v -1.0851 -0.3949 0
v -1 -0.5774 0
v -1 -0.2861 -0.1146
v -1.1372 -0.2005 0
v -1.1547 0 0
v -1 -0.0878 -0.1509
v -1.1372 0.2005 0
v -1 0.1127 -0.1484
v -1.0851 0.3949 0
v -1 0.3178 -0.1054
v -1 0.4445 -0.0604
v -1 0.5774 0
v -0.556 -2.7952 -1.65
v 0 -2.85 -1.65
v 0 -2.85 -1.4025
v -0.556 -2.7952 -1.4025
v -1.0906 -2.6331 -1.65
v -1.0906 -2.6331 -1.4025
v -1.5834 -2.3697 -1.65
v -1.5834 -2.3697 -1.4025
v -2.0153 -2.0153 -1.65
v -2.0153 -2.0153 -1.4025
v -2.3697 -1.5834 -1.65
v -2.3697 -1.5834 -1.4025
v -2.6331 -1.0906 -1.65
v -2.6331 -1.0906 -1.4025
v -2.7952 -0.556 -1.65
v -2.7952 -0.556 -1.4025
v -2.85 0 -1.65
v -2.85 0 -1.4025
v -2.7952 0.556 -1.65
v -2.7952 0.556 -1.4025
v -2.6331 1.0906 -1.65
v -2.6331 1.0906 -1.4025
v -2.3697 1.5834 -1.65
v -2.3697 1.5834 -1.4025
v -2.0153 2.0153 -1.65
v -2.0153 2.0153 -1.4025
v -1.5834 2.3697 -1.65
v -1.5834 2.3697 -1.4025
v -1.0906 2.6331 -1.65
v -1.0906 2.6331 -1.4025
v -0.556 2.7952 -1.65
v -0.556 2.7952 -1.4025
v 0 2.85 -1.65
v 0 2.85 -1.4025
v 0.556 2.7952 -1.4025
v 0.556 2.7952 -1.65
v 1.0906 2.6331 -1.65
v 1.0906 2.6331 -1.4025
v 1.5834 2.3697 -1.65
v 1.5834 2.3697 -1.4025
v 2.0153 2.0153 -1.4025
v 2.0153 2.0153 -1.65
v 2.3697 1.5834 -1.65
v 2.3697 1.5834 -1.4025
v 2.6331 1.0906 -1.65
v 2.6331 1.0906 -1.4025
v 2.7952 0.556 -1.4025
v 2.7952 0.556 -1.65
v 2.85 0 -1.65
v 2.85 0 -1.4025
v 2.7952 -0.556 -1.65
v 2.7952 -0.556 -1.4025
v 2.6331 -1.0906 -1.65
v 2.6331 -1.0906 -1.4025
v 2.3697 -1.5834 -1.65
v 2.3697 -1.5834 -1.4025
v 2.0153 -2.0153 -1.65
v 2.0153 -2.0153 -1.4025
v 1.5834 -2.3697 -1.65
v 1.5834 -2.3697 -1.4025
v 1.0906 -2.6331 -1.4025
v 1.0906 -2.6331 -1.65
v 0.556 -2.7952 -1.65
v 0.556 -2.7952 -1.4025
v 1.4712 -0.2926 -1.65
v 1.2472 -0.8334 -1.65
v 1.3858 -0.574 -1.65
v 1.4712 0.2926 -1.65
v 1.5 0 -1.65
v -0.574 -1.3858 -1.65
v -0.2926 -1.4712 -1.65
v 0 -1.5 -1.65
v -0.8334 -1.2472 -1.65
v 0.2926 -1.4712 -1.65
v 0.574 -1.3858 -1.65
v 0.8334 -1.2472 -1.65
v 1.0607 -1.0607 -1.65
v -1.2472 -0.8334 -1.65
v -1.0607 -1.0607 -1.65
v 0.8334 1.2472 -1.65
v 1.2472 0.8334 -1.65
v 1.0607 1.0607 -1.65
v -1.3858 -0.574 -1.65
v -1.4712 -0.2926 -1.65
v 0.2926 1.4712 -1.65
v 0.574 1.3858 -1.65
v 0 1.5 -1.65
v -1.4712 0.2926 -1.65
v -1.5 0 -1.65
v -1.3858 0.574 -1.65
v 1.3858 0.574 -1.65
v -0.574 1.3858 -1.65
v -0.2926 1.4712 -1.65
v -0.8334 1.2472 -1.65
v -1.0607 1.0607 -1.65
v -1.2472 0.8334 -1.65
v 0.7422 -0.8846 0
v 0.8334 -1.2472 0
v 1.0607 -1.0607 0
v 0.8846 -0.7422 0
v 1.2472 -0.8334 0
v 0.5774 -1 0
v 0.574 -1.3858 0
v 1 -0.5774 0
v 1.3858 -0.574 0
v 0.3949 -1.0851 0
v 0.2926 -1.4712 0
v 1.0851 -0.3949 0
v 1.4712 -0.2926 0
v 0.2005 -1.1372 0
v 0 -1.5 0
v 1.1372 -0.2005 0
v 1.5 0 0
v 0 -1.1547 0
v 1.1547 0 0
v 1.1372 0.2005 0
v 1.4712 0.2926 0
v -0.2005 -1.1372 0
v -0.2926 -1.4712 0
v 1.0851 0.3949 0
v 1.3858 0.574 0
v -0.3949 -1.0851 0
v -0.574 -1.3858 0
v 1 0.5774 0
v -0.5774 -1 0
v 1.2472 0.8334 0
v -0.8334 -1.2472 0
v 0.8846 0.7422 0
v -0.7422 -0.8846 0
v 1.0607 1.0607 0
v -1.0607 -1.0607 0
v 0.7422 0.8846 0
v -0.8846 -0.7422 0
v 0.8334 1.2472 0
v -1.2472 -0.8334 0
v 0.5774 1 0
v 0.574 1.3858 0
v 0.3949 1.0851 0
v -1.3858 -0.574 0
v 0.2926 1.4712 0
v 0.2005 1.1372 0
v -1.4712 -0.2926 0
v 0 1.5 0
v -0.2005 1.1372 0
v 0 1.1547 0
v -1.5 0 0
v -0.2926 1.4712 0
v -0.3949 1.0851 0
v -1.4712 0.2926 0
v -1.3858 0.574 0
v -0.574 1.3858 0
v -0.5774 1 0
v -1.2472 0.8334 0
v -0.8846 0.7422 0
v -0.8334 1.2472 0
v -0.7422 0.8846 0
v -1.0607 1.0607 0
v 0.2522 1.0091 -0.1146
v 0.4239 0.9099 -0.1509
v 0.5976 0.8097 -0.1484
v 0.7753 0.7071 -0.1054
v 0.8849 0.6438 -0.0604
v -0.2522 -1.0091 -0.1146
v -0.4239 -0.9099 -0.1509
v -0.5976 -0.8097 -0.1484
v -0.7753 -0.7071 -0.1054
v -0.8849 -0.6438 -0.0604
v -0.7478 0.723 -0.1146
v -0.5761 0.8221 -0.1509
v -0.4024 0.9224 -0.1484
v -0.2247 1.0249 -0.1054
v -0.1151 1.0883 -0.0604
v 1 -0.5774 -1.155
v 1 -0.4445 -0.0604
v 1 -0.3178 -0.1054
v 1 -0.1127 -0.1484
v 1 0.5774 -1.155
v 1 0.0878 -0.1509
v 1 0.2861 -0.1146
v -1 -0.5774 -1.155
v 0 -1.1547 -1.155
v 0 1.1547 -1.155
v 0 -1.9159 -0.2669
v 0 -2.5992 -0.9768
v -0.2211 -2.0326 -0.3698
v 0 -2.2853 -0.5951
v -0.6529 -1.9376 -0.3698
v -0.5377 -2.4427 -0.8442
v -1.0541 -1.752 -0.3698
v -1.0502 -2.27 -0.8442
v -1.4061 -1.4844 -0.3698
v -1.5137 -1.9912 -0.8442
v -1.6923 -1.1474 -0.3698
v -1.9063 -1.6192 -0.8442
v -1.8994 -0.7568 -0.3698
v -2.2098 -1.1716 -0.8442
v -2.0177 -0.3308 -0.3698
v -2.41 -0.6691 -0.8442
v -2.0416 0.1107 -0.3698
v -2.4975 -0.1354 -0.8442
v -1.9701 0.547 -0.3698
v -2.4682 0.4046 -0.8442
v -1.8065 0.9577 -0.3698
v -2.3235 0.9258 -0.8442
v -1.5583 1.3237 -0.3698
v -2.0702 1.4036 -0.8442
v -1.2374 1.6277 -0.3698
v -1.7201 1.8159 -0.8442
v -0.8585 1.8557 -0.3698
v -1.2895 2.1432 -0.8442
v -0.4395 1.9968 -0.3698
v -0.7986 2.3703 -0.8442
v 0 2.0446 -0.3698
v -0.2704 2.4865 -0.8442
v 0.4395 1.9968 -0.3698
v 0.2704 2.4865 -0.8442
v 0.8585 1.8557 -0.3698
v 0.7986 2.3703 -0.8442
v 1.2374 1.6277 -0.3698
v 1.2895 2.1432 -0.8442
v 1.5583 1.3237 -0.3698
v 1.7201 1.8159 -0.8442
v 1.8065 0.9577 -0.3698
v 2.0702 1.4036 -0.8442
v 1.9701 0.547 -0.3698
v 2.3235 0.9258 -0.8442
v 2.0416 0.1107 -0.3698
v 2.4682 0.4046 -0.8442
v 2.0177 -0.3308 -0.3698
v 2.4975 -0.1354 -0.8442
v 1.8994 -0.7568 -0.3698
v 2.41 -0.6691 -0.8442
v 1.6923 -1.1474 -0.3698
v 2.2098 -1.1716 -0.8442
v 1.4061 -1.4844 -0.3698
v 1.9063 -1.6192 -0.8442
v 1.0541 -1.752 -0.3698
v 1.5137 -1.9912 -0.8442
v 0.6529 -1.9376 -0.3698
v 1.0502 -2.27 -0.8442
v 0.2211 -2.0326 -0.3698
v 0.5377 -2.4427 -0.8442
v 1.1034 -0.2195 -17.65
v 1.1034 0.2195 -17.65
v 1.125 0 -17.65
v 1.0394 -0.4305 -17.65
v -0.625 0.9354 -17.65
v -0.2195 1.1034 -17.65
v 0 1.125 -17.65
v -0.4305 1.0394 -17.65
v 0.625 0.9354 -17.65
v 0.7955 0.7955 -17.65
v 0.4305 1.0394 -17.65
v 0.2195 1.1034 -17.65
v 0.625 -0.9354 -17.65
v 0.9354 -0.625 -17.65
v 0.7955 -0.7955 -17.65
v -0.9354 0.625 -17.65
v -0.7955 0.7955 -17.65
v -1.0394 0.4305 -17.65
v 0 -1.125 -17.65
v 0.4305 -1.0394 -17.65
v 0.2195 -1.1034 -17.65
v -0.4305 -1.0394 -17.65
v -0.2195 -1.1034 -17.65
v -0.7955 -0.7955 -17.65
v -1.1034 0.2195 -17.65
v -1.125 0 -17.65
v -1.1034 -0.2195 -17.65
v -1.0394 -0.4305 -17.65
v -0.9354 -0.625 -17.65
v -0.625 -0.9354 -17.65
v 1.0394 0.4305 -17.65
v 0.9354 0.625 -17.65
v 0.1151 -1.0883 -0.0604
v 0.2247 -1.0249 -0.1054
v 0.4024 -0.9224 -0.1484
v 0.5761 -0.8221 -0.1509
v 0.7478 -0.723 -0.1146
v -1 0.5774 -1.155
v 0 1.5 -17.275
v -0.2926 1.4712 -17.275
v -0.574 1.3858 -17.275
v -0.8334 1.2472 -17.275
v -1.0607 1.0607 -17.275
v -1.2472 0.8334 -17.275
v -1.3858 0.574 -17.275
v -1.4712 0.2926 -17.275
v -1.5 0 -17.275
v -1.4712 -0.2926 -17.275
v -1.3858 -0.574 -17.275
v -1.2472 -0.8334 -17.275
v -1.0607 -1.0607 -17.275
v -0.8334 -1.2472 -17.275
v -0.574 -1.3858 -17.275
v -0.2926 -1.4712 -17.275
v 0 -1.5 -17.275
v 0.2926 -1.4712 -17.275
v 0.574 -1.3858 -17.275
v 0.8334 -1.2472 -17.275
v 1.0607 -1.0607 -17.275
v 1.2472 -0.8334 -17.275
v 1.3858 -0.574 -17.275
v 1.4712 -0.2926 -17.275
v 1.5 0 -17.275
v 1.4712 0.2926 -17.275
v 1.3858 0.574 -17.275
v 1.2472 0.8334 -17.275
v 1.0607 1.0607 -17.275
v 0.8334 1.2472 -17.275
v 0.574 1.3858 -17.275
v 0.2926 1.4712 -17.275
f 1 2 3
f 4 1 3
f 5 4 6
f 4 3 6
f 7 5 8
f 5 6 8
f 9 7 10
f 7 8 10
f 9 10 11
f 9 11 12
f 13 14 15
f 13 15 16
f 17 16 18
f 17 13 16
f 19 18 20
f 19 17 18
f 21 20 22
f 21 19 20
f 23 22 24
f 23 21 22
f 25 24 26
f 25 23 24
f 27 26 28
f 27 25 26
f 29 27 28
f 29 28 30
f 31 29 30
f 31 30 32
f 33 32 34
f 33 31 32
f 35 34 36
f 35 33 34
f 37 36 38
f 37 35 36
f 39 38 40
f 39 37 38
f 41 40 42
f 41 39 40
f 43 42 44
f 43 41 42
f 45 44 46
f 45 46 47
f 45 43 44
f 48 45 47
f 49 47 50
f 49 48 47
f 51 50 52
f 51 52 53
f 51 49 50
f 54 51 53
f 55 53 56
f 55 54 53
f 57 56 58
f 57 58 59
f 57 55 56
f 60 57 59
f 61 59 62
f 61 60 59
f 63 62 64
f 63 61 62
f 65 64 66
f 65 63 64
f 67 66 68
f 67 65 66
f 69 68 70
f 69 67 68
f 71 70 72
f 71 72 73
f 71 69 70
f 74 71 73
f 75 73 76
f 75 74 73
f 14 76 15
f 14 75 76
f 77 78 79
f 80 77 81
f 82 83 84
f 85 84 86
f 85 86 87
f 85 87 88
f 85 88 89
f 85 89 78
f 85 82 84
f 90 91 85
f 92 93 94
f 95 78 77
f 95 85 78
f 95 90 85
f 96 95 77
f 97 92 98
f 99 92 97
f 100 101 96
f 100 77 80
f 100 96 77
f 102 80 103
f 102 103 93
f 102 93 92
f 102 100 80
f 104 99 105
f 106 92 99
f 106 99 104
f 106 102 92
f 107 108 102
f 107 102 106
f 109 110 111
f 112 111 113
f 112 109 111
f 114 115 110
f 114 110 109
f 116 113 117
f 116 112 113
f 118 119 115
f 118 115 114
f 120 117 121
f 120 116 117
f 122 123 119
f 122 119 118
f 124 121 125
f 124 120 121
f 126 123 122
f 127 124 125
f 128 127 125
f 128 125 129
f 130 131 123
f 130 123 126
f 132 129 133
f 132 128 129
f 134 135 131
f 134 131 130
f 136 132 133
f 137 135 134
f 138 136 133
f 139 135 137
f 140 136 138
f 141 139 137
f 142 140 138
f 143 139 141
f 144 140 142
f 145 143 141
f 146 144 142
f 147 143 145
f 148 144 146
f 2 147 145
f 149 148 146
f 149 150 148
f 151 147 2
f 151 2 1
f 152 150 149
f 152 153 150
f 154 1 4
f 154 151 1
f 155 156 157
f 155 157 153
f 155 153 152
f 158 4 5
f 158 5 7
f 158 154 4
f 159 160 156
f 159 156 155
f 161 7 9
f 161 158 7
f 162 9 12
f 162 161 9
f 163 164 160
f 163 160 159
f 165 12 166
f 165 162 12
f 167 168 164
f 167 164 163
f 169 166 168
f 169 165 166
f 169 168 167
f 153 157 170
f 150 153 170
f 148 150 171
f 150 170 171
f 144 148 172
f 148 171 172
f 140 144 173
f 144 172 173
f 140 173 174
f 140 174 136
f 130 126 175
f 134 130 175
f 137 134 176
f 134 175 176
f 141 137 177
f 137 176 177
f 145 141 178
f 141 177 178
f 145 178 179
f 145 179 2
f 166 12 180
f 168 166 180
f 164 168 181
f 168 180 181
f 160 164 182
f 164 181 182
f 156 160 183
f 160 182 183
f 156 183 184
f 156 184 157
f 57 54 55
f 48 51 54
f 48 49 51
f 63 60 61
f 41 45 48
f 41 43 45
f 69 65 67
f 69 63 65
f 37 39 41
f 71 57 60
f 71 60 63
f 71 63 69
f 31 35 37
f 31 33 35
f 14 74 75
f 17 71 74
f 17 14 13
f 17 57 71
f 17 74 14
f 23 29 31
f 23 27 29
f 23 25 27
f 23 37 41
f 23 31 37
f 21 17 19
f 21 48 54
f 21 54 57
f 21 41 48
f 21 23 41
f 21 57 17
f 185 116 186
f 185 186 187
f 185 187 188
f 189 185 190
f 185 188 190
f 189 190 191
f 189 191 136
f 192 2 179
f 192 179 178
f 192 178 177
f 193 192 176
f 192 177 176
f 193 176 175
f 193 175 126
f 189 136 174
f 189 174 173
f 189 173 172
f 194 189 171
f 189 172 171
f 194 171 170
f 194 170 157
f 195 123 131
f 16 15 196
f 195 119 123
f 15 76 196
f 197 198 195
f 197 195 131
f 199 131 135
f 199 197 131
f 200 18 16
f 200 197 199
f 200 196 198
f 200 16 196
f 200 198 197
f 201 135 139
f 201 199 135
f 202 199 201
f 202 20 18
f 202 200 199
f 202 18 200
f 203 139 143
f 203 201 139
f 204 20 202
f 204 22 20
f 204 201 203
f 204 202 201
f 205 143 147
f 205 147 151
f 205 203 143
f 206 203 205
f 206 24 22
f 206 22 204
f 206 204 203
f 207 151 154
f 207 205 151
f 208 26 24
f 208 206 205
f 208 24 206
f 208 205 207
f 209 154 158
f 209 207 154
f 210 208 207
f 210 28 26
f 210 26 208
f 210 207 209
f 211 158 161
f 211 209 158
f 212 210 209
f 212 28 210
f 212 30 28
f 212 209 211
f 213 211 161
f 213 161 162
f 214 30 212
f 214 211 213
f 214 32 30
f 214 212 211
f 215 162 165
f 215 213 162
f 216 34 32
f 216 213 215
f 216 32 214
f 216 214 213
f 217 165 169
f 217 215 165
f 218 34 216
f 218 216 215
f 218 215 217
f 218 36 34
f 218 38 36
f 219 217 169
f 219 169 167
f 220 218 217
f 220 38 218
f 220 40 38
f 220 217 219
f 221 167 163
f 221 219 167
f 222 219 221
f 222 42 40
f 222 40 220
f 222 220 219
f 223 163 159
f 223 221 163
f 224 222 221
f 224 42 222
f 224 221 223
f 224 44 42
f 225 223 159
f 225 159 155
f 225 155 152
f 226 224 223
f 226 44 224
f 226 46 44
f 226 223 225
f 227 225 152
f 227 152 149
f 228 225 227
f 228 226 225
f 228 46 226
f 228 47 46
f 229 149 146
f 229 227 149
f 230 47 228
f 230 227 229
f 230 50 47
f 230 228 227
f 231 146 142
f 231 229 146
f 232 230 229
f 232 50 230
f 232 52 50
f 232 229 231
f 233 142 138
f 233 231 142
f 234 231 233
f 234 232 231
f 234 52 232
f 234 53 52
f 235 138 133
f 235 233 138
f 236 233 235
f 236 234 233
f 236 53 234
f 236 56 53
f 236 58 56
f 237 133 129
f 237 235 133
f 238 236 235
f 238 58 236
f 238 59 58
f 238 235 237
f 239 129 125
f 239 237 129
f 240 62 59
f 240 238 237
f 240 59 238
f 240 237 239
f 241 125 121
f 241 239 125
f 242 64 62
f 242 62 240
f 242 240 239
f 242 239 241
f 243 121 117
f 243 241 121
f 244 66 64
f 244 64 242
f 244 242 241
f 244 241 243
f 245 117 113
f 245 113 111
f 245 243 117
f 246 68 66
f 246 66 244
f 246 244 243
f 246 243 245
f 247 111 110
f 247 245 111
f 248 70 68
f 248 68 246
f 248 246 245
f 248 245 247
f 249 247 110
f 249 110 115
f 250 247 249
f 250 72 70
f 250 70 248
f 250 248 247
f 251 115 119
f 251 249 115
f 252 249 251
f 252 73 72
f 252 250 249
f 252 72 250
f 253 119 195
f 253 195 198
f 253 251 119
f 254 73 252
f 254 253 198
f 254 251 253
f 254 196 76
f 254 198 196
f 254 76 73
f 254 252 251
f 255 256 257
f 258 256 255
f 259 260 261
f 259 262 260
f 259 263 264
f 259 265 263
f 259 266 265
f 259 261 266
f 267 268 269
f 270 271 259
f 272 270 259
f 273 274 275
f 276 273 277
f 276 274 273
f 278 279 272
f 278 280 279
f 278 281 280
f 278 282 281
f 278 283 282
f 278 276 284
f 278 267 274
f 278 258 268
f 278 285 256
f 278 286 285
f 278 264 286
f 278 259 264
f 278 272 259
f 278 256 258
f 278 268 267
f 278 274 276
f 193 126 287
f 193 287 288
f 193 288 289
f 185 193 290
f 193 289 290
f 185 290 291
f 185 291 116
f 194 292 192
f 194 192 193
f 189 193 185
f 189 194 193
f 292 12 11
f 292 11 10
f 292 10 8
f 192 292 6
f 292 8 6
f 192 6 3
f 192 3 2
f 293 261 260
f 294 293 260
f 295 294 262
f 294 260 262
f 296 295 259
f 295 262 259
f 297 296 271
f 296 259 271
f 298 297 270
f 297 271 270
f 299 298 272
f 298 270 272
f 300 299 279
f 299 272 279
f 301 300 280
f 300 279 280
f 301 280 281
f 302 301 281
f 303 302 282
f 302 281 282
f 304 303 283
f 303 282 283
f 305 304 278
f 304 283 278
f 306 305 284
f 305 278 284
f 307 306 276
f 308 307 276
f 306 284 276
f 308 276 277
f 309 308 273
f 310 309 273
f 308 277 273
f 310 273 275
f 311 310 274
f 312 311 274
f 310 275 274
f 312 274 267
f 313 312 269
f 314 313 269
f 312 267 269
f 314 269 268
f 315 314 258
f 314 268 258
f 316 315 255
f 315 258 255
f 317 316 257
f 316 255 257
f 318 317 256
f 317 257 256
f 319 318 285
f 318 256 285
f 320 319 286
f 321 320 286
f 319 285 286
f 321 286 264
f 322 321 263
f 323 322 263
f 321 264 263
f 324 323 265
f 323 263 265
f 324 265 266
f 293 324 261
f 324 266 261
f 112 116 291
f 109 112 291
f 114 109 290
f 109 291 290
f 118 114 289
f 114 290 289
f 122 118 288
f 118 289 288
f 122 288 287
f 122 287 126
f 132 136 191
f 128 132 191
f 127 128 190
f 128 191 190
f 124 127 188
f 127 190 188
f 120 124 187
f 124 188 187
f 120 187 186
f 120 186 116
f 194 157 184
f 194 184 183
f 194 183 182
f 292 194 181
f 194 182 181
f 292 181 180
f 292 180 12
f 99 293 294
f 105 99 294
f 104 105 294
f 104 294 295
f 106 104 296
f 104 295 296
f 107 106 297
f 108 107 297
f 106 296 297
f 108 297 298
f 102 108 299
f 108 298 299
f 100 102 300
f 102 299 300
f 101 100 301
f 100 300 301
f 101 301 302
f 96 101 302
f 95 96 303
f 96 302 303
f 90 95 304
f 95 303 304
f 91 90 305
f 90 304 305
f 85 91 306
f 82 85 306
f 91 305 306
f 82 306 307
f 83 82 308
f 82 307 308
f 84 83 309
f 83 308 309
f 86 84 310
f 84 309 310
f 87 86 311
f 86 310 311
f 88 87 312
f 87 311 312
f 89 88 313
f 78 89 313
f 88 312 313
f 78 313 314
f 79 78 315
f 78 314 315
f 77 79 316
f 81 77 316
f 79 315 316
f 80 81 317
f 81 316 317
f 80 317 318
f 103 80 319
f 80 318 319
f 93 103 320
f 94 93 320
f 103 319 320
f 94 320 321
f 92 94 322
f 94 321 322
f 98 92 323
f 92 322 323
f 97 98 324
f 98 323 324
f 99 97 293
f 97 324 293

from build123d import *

# Parameters (mm, degrees)
SKETCH1_W              = 16
SKETCH1_H              = 1.5
CUT_EXTRUDE2_DEPTH     = 1.155
SPLIT1_SURFACE_1_BACK  = 20.404
SPLIT1_SURFACE_1_DEPTH = 40.808
SPLIT1_SURFACE_2_BACK  = 20.404
SPLIT1_SURFACE_2_DEPTH = 40.808
CHAMFER1_SIZE          = 0.375


with BuildPart() as part:
    # Sketch1 → Revolve1 (revolve)
    with BuildSketch(Plane(origin=(0, 0, 0), x_dir=(0, 0, -1), z_dir=(1, 0, 0))):
        with Locations((9.65, 0.75)):
            Rectangle(SKETCH1_W, SKETCH1_H)
    revolve(axis=Axis((0, 0, -17.65), (0, 0, 1)))

    # Sketch7 → Revolve2 (revolve)
    with BuildSketch(Plane(origin=(0, 0, 0), x_dir=(0, 0, -1), z_dir=(1, 0, 0))):
        with BuildLine():
            Line((1.4025, 2.85), (1.65, 2.85))
            Line((1.65, 2.85), (1.65, 0))
            Line((1.65, 0), (0, 0))
            Line((0, 0), (0, 1.5))
            ThreePointArc((0, 1.5), (0.59512511, 2.285251969), (1.4025, 2.85))
        make_face()
    revolve(axis=Axis((0, 0, 0), (0, 0, -1)))

    # Sketch5 → Cut-Extrude2 (cut)
    with BuildSketch(Plane.XY):
        Polygon((1, -0.577350269), (1, 0.577350269), (0, 1.154700538), (-1, 0.577350269), (-1, -0.577350269), (0, -1.154700538), align=None)
    extrude(amount=-CUT_EXTRUDE2_DEPTH, mode=Mode.SUBTRACT)

    # Cut-Extrude3 cone 1 section (through the dimple's axis) → Cut-Extrude3 (revolve, cut)
    with BuildSketch(Plane(origin=(0, 0, 0), x_dir=(0, -1, 0), z_dir=(1, 0, 0))):
        Polygon((0, 0), (1.154700538, 0), (0, 1.154700538), align=None)
    revolve(axis=Axis((0, 0, 0), (0, 0, -1)), mode=Mode.SUBTRACT)


with BuildPart() as body_2:
    # Split1: the piece behind the surface
    add(part.part)
    # Split1 surface: a surface, the sketch's curves swept straight by 40.808 mm
    with BuildLine(Plane(origin=(0, 0, 0), x_dir=(0, 0, -1), z_dir=(1, 0, 0)).offset(-SPLIT1_SURFACE_1_BACK), mode=Mode.PRIVATE) as split1_surface_1_path:
        Line((1.65, -2.85), (1.65, 2.85))
    split1_surface_1 = Shell.extrude(split1_surface_1_path.wire(), (1 * SPLIT1_SURFACE_1_DEPTH, 0 * SPLIT1_SURFACE_1_DEPTH, 0 * SPLIT1_SURFACE_1_DEPTH))
    split(bisect_by=split1_surface_1, keep=Keep.BOTTOM)

    # Chamfer1
    chamfer1_edges = [body_2.edges().sort_by_distance(p)[0] for p in [
        (0, -1.5, -17.65),
    ]]
    chamfer(chamfer1_edges, length=CHAMFER1_SIZE)


with BuildPart() as part_1:
    add(part.part)

    # Split1: split by a surface, the side it looks to stays
    # Split1 surface: a surface, the sketch's curves swept straight by 40.808 mm
    with BuildLine(Plane(origin=(0, 0, 0), x_dir=(0, 0, -1), z_dir=(1, 0, 0)).offset(-SPLIT1_SURFACE_2_BACK), mode=Mode.PRIVATE) as split1_surface_2_path:
        Line((1.65, -2.85), (1.65, 2.85))
    split1_surface_2 = Shell.extrude(split1_surface_2_path.wire(), (1 * SPLIT1_SURFACE_2_DEPTH, 0 * SPLIT1_SURFACE_2_DEPTH, 0 * SPLIT1_SURFACE_2_DEPTH))
    split(bisect_by=split1_surface_2, keep=Keep.TOP)


solid = Compound([body_2.part, part_1.part])
